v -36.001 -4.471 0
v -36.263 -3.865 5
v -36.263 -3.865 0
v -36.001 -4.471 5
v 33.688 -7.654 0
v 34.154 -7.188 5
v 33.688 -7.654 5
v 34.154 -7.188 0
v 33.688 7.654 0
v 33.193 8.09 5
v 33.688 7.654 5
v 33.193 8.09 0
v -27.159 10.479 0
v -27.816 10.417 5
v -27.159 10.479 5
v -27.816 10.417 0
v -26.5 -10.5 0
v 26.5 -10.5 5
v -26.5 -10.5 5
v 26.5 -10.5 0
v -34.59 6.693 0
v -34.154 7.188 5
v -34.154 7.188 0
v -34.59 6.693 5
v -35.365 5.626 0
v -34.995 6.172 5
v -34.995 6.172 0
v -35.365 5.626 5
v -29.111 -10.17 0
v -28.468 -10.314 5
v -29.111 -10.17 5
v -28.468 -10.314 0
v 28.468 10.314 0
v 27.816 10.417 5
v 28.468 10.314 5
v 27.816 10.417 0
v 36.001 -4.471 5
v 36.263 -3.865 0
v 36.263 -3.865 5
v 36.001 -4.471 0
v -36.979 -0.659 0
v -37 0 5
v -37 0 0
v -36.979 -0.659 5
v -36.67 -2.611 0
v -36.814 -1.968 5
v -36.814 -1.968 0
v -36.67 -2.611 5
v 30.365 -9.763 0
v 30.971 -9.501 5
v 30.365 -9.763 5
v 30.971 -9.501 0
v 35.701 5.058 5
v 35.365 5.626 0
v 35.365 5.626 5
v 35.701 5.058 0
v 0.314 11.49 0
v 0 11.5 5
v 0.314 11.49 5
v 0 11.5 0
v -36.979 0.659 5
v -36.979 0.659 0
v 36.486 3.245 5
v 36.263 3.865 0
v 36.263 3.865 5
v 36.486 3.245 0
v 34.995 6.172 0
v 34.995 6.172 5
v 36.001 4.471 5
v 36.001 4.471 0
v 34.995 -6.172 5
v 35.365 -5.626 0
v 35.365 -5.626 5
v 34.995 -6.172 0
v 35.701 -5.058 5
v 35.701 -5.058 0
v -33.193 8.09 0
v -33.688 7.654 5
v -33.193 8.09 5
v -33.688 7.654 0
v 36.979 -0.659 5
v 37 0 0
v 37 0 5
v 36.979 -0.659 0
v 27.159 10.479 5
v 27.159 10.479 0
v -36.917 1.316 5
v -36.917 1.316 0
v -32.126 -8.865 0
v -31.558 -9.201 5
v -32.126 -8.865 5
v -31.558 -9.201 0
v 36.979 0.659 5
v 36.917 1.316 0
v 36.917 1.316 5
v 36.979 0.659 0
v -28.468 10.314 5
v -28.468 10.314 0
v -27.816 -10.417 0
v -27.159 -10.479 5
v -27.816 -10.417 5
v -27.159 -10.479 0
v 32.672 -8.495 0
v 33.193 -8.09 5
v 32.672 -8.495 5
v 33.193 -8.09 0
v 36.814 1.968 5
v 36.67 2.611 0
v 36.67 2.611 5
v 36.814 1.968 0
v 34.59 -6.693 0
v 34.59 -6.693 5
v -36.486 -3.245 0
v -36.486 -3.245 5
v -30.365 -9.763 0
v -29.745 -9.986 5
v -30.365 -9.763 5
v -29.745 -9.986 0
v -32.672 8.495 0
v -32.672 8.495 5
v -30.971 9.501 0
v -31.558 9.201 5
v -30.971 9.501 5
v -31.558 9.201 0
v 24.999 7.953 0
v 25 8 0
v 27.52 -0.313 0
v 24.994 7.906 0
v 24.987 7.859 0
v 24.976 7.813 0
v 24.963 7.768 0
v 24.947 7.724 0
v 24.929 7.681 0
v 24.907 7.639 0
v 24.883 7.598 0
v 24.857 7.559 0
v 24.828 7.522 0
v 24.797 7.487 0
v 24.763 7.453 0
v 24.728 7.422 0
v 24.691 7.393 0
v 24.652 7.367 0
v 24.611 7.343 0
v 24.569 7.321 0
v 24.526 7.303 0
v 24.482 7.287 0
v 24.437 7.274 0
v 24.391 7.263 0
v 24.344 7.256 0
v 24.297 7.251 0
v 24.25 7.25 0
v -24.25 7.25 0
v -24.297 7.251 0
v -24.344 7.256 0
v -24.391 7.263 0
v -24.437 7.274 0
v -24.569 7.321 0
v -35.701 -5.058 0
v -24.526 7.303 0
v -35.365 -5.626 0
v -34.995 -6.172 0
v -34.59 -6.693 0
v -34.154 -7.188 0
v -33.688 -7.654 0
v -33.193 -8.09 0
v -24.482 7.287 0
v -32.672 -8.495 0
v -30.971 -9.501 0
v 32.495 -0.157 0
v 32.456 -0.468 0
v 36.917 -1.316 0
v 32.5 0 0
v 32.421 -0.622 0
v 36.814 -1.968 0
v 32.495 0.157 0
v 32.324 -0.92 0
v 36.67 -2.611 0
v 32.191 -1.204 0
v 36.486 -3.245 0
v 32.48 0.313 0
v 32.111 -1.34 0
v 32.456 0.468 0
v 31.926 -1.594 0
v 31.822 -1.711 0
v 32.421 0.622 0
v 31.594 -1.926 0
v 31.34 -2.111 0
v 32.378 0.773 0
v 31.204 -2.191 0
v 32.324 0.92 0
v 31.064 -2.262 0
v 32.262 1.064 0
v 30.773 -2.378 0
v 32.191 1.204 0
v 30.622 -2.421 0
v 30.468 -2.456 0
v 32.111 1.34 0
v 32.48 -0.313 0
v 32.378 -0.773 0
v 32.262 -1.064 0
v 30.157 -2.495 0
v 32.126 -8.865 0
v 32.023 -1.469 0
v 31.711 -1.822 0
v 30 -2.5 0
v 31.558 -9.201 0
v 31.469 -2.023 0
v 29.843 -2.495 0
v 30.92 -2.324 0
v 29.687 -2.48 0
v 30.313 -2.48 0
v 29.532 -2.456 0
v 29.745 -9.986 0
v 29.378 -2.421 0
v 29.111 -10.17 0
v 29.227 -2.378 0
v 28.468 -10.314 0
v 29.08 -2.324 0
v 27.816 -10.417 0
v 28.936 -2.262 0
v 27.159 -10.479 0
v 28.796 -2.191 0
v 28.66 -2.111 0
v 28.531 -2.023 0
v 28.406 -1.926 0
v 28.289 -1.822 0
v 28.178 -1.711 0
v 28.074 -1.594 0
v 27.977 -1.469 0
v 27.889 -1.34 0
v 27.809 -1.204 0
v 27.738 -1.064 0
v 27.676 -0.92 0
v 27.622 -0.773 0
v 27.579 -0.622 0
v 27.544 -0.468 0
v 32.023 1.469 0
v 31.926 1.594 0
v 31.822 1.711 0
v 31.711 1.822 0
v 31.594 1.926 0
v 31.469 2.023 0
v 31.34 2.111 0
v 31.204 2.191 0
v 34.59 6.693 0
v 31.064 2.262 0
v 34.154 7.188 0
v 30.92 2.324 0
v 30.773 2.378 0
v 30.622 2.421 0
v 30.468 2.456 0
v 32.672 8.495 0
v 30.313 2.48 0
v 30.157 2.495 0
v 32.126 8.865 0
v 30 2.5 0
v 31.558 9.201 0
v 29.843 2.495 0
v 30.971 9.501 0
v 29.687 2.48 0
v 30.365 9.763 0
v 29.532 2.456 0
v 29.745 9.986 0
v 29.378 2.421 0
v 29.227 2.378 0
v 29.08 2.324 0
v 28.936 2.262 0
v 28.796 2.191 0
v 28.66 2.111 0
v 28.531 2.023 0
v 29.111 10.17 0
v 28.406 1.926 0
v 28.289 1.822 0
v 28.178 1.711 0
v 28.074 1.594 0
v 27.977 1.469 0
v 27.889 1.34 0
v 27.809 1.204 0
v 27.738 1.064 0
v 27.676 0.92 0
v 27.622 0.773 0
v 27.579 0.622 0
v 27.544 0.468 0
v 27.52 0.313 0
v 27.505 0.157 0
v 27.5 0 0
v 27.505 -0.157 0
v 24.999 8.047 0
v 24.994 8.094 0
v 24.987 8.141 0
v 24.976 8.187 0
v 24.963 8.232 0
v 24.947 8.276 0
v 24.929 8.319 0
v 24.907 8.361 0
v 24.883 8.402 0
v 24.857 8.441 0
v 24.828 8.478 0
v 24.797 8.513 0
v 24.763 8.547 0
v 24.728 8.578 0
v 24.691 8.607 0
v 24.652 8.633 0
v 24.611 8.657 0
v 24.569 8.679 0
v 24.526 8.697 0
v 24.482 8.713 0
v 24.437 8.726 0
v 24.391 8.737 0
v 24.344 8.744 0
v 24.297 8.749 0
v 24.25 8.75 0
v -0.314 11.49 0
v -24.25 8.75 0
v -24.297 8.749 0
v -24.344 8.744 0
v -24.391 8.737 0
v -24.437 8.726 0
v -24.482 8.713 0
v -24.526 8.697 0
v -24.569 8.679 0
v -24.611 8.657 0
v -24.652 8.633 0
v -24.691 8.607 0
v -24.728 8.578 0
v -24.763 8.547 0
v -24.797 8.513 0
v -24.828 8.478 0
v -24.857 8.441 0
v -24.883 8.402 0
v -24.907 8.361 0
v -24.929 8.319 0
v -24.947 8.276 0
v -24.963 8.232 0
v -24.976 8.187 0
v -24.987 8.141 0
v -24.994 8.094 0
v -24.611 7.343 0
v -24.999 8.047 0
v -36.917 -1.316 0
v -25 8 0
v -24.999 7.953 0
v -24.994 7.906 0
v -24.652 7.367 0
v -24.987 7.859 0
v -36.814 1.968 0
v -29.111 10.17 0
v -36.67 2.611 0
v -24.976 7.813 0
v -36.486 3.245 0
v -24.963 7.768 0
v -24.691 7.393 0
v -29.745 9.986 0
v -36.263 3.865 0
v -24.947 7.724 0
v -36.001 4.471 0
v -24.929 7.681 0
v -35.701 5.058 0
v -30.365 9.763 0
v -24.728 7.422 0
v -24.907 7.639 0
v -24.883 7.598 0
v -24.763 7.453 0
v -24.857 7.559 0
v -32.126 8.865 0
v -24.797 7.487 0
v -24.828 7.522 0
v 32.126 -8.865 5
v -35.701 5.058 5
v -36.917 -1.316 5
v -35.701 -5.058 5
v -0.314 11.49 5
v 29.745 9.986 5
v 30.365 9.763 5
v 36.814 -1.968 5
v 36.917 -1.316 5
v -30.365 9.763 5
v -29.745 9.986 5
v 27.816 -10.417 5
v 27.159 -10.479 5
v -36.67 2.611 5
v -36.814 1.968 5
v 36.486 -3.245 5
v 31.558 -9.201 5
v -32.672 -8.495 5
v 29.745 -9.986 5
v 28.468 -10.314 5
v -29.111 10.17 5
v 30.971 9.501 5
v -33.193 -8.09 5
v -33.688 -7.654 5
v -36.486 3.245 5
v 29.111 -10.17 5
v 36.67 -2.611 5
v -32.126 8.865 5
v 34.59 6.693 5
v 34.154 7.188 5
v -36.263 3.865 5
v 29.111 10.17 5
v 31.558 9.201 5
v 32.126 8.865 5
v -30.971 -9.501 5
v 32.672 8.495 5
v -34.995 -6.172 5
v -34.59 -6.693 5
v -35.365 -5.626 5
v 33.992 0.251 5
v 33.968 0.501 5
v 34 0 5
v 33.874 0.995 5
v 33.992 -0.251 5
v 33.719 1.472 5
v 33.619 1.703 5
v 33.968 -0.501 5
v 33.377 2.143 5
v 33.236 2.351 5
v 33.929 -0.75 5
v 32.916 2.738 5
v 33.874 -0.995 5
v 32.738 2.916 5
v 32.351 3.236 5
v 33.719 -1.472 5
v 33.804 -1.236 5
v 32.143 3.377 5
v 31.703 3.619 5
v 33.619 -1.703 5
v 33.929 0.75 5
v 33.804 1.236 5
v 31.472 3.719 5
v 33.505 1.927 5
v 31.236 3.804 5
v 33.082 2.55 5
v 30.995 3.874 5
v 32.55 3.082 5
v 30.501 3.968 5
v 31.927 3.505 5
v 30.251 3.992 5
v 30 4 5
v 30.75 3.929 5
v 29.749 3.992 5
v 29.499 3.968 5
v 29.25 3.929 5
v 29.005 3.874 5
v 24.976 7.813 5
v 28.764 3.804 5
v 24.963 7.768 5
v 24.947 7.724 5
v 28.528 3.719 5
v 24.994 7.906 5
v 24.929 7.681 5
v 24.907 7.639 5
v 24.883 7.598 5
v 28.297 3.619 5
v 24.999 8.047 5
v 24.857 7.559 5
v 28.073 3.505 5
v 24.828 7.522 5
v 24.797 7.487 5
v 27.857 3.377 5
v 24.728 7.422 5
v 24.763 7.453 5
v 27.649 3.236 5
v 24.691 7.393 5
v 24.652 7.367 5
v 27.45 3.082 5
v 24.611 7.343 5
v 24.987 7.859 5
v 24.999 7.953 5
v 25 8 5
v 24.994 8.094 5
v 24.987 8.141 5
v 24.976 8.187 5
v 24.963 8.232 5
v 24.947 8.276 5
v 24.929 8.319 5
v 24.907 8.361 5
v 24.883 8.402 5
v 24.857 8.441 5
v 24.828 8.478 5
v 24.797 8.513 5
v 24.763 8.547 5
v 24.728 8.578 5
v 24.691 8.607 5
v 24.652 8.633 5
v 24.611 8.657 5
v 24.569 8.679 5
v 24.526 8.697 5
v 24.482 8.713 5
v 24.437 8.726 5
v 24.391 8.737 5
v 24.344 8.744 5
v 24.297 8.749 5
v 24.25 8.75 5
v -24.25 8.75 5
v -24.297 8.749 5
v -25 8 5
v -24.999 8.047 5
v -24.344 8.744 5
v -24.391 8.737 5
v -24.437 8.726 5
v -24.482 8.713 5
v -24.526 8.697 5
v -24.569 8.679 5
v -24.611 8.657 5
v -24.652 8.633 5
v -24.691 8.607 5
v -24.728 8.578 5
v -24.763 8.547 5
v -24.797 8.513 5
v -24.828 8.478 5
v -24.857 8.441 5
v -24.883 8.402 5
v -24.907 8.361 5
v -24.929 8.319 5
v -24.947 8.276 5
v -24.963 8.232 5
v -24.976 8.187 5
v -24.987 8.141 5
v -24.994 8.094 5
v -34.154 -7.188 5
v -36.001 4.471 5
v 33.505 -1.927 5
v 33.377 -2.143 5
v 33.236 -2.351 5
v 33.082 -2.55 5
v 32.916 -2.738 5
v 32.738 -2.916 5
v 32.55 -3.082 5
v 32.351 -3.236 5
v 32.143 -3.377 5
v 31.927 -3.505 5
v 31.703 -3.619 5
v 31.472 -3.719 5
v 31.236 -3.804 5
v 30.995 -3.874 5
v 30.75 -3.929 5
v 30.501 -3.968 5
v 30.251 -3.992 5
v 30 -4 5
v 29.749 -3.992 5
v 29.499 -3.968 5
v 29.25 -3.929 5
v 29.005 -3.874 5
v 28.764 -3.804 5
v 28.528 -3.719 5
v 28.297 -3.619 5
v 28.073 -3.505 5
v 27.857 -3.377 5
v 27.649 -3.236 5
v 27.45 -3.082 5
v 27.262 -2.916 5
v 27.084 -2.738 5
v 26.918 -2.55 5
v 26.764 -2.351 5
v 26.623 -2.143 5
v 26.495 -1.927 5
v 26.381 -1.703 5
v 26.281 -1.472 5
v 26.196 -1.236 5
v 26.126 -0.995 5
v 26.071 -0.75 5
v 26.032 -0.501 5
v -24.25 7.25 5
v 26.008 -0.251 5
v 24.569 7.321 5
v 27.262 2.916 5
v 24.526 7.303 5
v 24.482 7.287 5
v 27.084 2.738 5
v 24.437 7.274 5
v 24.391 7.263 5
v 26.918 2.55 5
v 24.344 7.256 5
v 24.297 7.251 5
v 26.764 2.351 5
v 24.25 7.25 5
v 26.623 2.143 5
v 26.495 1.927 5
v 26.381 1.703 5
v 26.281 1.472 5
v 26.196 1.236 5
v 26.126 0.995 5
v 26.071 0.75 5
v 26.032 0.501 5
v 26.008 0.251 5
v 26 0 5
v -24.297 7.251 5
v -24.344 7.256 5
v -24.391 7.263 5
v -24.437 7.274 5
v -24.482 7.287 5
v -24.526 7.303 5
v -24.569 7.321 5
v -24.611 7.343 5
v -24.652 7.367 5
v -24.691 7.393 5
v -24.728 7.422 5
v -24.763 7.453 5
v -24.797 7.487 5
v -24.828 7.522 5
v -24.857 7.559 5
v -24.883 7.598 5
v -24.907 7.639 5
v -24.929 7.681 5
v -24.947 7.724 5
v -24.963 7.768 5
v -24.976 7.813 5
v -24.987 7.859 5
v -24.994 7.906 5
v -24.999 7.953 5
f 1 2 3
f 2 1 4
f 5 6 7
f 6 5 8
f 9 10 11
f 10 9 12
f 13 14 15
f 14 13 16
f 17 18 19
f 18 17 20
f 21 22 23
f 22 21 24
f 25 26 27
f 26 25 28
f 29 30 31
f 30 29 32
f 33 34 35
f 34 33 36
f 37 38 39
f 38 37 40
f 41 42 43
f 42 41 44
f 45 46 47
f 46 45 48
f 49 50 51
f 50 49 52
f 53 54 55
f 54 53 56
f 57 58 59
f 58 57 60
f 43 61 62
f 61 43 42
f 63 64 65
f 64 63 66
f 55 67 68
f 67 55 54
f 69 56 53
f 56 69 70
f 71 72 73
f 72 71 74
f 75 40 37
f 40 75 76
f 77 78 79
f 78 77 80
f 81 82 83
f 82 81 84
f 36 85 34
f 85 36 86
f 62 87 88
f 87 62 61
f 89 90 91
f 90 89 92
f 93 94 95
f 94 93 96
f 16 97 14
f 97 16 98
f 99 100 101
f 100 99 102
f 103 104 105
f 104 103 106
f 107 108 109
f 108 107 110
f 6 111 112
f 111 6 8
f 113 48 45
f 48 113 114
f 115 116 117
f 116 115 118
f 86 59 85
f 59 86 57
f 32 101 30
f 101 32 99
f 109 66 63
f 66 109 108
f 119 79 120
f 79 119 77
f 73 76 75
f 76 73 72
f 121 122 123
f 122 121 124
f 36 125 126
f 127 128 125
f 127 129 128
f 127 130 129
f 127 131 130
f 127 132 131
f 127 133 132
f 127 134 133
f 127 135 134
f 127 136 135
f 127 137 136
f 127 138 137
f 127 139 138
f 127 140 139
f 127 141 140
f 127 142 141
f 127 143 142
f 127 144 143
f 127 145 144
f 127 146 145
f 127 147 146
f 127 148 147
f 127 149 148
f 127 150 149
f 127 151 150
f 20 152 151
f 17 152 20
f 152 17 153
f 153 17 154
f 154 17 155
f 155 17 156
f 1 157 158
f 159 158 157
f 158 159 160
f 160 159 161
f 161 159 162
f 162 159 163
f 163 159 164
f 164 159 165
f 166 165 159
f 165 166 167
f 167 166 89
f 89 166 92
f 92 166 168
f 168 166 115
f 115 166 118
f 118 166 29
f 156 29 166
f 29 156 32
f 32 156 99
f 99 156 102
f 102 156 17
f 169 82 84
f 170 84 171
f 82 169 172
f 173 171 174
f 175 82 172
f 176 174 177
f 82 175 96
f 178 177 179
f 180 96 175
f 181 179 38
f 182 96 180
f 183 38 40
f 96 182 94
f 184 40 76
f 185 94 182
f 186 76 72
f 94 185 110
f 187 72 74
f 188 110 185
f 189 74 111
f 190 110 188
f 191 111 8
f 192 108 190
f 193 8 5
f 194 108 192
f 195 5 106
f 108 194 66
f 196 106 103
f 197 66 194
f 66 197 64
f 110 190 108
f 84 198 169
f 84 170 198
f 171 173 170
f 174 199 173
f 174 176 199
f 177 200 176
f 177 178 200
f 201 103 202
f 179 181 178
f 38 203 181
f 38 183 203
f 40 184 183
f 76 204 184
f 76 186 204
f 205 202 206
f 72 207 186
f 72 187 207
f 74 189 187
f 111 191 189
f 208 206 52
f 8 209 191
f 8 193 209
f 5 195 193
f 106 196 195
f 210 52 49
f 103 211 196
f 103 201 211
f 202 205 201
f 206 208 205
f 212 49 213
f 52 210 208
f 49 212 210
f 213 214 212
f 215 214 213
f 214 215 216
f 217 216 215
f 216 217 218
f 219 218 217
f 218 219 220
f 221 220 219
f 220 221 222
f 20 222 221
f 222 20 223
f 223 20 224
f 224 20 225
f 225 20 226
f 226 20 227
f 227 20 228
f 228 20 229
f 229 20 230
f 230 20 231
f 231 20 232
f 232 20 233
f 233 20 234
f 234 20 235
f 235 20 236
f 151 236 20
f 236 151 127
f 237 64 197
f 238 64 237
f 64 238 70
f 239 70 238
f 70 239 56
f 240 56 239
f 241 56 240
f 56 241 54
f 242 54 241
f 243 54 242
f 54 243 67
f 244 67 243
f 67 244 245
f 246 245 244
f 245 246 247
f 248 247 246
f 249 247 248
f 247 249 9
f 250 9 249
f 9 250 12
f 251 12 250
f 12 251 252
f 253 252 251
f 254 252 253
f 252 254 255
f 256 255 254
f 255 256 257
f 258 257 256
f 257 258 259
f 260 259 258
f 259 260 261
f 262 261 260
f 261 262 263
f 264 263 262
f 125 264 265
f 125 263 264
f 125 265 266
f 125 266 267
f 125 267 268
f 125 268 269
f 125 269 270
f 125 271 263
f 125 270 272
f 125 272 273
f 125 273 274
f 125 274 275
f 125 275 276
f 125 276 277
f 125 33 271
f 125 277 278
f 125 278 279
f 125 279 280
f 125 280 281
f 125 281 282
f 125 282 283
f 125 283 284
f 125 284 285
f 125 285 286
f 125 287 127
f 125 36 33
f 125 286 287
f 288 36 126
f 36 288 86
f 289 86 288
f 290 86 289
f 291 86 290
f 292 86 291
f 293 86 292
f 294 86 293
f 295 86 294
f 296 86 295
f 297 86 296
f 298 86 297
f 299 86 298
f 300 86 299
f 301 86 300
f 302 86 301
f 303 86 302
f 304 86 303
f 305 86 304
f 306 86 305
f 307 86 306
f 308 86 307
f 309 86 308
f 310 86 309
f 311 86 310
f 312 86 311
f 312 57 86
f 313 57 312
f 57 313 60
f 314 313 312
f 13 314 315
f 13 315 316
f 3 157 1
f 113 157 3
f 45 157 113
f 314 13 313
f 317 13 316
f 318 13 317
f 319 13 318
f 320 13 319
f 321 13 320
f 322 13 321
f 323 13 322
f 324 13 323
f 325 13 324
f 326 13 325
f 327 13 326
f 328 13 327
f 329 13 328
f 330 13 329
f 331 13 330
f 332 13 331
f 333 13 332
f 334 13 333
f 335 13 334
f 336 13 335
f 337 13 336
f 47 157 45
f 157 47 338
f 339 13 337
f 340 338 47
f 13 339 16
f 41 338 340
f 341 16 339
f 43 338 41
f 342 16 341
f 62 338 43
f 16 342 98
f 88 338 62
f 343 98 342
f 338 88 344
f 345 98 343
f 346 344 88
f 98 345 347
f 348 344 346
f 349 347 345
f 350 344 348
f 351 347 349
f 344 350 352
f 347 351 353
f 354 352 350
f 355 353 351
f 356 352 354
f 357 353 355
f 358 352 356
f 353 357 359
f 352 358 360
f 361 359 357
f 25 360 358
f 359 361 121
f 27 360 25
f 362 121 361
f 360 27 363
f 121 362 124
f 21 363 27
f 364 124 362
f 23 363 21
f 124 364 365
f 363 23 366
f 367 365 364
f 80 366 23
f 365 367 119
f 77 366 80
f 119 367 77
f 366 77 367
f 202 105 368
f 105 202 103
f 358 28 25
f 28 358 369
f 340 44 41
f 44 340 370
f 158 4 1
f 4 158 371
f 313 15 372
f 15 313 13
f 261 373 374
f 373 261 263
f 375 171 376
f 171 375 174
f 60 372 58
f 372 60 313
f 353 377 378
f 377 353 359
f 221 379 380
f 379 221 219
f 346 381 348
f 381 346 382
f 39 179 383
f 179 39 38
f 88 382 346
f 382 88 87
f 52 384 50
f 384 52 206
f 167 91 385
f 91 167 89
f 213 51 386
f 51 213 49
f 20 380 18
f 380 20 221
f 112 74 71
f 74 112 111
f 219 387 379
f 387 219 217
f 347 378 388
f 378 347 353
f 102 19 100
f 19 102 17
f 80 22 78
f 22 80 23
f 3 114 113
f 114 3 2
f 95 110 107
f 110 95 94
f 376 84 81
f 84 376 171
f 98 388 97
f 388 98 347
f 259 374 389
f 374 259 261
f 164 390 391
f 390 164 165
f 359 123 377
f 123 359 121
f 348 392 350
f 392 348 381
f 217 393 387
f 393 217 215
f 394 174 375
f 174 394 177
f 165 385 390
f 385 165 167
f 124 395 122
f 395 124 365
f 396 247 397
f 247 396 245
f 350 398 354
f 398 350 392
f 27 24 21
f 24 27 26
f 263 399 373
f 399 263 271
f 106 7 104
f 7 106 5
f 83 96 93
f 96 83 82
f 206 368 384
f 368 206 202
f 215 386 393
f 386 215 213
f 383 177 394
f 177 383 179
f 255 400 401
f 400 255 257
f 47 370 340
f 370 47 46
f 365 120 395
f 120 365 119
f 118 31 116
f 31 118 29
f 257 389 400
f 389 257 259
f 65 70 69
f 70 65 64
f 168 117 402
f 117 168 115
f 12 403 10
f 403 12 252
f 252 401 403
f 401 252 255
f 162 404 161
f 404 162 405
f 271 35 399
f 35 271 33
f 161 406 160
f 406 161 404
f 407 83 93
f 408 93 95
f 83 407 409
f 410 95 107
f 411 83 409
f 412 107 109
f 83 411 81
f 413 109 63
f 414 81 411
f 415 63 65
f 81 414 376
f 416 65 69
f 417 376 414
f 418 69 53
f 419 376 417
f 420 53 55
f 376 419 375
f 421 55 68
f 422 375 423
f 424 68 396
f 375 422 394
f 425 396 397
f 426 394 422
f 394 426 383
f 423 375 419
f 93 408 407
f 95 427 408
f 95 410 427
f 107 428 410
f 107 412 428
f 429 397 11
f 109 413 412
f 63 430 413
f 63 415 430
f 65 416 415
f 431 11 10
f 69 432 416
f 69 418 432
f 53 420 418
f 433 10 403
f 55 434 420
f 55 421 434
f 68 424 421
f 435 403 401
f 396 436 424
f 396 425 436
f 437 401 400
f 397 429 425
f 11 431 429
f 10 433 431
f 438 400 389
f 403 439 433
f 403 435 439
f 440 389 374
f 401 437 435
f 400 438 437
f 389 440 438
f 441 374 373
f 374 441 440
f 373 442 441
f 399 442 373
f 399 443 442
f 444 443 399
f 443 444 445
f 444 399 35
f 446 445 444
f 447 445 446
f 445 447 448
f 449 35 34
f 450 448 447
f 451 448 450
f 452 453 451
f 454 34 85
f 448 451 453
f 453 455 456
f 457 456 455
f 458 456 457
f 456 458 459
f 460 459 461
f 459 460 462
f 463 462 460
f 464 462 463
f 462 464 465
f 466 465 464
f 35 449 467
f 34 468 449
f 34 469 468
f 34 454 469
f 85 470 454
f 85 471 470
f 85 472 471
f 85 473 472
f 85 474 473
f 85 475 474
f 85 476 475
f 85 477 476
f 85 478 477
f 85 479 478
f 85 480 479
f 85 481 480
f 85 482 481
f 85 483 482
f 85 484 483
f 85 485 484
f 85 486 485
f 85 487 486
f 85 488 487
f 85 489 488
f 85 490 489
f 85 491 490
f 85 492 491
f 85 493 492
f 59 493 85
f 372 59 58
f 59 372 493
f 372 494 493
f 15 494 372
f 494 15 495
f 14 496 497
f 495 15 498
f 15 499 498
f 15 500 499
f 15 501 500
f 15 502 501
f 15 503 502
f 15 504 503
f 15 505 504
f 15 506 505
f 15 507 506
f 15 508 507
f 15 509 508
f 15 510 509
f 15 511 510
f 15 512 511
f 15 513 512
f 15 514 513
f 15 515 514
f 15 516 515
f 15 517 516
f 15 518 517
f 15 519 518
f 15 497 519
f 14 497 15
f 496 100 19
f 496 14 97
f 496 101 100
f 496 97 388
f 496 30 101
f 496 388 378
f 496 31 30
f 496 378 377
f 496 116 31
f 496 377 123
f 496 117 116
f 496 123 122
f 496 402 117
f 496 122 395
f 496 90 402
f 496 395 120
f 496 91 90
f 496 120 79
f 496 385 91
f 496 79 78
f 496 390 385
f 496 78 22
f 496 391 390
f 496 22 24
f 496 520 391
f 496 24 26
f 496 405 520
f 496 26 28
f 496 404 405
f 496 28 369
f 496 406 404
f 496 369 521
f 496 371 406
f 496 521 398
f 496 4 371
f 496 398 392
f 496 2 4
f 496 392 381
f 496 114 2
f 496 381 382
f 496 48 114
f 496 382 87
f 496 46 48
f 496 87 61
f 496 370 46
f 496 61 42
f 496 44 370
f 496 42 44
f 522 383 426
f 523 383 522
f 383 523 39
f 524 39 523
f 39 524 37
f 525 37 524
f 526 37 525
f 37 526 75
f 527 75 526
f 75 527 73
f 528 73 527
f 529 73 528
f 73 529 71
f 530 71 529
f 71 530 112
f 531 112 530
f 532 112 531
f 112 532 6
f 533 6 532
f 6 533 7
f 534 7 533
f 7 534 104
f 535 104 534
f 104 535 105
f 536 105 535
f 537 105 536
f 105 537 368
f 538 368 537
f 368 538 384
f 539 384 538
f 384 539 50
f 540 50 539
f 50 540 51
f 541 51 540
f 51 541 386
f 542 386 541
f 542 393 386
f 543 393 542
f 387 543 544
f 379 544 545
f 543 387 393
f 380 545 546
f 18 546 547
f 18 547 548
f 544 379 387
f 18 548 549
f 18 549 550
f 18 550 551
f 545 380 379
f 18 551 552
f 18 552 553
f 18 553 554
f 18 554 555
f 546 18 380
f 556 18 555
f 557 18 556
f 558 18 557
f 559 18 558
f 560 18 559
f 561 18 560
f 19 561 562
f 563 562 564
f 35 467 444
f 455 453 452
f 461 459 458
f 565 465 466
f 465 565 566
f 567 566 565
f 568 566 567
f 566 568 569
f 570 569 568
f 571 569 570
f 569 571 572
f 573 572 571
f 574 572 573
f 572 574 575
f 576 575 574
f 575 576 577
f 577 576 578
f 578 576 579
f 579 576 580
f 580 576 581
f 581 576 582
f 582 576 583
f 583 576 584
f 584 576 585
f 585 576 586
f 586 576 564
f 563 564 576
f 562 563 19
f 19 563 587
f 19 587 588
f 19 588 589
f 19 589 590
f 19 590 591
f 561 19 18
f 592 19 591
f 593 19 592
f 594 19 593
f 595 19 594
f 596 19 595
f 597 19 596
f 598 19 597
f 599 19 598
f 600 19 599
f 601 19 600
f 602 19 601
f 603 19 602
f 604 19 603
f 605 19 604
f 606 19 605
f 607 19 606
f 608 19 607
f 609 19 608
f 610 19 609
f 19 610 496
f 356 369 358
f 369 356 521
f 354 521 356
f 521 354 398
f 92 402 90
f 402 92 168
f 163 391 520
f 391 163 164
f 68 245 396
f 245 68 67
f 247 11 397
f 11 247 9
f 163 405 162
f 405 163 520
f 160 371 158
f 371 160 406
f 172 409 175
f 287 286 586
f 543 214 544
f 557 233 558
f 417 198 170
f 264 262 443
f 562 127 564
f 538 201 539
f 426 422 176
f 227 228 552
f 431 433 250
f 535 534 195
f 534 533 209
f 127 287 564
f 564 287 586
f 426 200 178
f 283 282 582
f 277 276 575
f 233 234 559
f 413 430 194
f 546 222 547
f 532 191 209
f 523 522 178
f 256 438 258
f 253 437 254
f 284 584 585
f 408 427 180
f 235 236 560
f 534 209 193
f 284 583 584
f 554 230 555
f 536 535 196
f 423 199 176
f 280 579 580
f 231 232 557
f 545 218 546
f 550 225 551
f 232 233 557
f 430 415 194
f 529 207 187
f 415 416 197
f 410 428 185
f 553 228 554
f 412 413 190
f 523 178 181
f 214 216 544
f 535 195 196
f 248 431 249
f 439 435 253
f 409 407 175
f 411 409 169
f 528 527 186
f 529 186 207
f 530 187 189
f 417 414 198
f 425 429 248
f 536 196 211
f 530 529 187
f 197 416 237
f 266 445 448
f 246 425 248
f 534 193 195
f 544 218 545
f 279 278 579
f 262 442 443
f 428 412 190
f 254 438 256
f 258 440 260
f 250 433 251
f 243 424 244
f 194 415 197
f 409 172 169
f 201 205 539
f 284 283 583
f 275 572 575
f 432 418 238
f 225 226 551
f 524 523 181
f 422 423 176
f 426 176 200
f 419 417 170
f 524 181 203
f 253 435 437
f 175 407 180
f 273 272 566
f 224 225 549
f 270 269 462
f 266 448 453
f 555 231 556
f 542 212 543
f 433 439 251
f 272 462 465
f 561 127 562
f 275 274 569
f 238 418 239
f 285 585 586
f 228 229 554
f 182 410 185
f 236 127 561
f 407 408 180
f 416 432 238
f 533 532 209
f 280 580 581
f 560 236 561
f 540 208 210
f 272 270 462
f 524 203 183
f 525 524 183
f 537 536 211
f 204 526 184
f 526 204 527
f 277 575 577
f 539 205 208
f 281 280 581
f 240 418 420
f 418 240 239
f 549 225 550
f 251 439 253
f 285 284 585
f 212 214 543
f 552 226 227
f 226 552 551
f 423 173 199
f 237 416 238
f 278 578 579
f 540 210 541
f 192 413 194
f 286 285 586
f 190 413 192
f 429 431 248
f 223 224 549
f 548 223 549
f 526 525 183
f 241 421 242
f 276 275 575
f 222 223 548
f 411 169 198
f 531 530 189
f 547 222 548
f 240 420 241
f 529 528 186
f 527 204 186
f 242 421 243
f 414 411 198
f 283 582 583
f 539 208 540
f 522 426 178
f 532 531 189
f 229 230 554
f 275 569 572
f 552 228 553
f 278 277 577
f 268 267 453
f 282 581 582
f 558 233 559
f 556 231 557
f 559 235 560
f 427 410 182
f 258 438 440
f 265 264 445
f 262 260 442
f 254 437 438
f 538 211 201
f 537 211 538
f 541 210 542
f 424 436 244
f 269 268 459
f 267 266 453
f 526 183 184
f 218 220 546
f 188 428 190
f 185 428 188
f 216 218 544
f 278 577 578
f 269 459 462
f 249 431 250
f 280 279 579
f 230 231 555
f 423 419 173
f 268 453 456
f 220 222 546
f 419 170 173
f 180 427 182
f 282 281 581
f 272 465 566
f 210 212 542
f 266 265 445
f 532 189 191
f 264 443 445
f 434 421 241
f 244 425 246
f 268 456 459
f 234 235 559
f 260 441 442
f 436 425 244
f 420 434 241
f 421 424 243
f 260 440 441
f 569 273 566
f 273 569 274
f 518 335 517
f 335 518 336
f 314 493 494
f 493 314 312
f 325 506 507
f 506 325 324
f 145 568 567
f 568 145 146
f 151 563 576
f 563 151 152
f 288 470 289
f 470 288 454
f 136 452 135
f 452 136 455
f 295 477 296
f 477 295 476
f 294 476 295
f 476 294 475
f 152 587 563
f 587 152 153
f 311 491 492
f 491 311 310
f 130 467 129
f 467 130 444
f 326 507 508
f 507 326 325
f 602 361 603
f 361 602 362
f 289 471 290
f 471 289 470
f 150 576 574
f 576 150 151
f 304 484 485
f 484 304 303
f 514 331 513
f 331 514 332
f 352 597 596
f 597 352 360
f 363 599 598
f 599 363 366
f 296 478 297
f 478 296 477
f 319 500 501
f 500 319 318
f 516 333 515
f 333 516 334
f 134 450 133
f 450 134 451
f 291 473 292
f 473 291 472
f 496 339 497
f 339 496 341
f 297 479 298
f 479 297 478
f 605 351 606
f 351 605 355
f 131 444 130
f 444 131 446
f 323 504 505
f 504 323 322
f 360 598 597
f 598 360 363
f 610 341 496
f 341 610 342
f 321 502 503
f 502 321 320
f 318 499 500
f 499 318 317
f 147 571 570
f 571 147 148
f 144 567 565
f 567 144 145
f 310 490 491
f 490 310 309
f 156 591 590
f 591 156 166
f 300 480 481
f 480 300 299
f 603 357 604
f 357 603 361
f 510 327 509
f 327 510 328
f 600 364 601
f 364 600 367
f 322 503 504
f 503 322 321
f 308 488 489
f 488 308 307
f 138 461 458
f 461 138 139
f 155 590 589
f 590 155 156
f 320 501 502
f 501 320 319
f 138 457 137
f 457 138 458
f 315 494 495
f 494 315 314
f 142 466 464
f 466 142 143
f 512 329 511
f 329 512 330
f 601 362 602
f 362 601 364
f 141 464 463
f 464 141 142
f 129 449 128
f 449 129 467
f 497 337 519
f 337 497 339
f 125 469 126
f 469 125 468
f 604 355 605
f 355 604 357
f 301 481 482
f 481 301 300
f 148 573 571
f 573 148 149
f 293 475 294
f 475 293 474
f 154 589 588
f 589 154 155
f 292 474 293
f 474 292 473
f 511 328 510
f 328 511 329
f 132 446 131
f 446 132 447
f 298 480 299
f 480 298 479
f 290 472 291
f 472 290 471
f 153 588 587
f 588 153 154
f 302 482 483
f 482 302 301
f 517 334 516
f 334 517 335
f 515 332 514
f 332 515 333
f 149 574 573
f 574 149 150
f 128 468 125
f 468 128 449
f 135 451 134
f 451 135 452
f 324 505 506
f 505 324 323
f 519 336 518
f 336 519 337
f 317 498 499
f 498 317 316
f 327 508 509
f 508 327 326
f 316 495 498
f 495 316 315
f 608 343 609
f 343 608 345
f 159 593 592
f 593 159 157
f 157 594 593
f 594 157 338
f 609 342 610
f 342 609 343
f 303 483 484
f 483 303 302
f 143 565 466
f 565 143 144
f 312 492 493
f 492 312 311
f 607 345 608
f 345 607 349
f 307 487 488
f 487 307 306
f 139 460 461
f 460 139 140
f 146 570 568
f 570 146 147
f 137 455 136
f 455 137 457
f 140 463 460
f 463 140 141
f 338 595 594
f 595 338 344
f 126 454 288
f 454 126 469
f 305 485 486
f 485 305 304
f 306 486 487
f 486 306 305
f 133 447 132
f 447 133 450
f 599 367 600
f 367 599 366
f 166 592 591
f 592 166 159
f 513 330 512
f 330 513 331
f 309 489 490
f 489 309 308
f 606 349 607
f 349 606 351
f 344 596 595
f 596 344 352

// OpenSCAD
THICKNESS = 5;
WIDTH = 21;
LENGTH = 74;

HOLE_OFFSET_X = 30;
HOLE_OFFSET_Y = 0;
HOLE_DIA_TOP = 8;
HOLE_DIA_BOT = 5;

SLOT_OFFSET_X = 0;
SLOT_OFFSET_Y = 8;
SLOT_WIDTH = 1.5;
SLOT_LENGTH = 50;

NUB_DIA = 10;
NUB_OFFSET = 1;

$fn = 100;

difference() {
    union() {
        hull() {
            for(i = [-1, 1]) {
                translate([i * (LENGTH-WIDTH)/2, 0, 0])
                cylinder(d = WIDTH, h = THICKNESS);
            }

            translate([0, (WIDTH-NUB_DIA)/2 + NUB_OFFSET, 0])
            cylinder(d = NUB_DIA, h = THICKNESS);
        }
    }

    translate([HOLE_OFFSET_X, HOLE_OFFSET_Y])
    cylinder(d1 = HOLE_DIA_BOT, d2 = HOLE_DIA_TOP, h = THICKNESS);

    translate([SLOT_OFFSET_X, SLOT_OFFSET_Y, 0])
    hull() {
        for(i = [-1, 1]) {
            translate([i * (SLOT_LENGTH-SLOT_WIDTH)/2, 0, 0])
            cylinder(d = SLOT_WIDTH, h = THICKNESS);
        }
    }

}
